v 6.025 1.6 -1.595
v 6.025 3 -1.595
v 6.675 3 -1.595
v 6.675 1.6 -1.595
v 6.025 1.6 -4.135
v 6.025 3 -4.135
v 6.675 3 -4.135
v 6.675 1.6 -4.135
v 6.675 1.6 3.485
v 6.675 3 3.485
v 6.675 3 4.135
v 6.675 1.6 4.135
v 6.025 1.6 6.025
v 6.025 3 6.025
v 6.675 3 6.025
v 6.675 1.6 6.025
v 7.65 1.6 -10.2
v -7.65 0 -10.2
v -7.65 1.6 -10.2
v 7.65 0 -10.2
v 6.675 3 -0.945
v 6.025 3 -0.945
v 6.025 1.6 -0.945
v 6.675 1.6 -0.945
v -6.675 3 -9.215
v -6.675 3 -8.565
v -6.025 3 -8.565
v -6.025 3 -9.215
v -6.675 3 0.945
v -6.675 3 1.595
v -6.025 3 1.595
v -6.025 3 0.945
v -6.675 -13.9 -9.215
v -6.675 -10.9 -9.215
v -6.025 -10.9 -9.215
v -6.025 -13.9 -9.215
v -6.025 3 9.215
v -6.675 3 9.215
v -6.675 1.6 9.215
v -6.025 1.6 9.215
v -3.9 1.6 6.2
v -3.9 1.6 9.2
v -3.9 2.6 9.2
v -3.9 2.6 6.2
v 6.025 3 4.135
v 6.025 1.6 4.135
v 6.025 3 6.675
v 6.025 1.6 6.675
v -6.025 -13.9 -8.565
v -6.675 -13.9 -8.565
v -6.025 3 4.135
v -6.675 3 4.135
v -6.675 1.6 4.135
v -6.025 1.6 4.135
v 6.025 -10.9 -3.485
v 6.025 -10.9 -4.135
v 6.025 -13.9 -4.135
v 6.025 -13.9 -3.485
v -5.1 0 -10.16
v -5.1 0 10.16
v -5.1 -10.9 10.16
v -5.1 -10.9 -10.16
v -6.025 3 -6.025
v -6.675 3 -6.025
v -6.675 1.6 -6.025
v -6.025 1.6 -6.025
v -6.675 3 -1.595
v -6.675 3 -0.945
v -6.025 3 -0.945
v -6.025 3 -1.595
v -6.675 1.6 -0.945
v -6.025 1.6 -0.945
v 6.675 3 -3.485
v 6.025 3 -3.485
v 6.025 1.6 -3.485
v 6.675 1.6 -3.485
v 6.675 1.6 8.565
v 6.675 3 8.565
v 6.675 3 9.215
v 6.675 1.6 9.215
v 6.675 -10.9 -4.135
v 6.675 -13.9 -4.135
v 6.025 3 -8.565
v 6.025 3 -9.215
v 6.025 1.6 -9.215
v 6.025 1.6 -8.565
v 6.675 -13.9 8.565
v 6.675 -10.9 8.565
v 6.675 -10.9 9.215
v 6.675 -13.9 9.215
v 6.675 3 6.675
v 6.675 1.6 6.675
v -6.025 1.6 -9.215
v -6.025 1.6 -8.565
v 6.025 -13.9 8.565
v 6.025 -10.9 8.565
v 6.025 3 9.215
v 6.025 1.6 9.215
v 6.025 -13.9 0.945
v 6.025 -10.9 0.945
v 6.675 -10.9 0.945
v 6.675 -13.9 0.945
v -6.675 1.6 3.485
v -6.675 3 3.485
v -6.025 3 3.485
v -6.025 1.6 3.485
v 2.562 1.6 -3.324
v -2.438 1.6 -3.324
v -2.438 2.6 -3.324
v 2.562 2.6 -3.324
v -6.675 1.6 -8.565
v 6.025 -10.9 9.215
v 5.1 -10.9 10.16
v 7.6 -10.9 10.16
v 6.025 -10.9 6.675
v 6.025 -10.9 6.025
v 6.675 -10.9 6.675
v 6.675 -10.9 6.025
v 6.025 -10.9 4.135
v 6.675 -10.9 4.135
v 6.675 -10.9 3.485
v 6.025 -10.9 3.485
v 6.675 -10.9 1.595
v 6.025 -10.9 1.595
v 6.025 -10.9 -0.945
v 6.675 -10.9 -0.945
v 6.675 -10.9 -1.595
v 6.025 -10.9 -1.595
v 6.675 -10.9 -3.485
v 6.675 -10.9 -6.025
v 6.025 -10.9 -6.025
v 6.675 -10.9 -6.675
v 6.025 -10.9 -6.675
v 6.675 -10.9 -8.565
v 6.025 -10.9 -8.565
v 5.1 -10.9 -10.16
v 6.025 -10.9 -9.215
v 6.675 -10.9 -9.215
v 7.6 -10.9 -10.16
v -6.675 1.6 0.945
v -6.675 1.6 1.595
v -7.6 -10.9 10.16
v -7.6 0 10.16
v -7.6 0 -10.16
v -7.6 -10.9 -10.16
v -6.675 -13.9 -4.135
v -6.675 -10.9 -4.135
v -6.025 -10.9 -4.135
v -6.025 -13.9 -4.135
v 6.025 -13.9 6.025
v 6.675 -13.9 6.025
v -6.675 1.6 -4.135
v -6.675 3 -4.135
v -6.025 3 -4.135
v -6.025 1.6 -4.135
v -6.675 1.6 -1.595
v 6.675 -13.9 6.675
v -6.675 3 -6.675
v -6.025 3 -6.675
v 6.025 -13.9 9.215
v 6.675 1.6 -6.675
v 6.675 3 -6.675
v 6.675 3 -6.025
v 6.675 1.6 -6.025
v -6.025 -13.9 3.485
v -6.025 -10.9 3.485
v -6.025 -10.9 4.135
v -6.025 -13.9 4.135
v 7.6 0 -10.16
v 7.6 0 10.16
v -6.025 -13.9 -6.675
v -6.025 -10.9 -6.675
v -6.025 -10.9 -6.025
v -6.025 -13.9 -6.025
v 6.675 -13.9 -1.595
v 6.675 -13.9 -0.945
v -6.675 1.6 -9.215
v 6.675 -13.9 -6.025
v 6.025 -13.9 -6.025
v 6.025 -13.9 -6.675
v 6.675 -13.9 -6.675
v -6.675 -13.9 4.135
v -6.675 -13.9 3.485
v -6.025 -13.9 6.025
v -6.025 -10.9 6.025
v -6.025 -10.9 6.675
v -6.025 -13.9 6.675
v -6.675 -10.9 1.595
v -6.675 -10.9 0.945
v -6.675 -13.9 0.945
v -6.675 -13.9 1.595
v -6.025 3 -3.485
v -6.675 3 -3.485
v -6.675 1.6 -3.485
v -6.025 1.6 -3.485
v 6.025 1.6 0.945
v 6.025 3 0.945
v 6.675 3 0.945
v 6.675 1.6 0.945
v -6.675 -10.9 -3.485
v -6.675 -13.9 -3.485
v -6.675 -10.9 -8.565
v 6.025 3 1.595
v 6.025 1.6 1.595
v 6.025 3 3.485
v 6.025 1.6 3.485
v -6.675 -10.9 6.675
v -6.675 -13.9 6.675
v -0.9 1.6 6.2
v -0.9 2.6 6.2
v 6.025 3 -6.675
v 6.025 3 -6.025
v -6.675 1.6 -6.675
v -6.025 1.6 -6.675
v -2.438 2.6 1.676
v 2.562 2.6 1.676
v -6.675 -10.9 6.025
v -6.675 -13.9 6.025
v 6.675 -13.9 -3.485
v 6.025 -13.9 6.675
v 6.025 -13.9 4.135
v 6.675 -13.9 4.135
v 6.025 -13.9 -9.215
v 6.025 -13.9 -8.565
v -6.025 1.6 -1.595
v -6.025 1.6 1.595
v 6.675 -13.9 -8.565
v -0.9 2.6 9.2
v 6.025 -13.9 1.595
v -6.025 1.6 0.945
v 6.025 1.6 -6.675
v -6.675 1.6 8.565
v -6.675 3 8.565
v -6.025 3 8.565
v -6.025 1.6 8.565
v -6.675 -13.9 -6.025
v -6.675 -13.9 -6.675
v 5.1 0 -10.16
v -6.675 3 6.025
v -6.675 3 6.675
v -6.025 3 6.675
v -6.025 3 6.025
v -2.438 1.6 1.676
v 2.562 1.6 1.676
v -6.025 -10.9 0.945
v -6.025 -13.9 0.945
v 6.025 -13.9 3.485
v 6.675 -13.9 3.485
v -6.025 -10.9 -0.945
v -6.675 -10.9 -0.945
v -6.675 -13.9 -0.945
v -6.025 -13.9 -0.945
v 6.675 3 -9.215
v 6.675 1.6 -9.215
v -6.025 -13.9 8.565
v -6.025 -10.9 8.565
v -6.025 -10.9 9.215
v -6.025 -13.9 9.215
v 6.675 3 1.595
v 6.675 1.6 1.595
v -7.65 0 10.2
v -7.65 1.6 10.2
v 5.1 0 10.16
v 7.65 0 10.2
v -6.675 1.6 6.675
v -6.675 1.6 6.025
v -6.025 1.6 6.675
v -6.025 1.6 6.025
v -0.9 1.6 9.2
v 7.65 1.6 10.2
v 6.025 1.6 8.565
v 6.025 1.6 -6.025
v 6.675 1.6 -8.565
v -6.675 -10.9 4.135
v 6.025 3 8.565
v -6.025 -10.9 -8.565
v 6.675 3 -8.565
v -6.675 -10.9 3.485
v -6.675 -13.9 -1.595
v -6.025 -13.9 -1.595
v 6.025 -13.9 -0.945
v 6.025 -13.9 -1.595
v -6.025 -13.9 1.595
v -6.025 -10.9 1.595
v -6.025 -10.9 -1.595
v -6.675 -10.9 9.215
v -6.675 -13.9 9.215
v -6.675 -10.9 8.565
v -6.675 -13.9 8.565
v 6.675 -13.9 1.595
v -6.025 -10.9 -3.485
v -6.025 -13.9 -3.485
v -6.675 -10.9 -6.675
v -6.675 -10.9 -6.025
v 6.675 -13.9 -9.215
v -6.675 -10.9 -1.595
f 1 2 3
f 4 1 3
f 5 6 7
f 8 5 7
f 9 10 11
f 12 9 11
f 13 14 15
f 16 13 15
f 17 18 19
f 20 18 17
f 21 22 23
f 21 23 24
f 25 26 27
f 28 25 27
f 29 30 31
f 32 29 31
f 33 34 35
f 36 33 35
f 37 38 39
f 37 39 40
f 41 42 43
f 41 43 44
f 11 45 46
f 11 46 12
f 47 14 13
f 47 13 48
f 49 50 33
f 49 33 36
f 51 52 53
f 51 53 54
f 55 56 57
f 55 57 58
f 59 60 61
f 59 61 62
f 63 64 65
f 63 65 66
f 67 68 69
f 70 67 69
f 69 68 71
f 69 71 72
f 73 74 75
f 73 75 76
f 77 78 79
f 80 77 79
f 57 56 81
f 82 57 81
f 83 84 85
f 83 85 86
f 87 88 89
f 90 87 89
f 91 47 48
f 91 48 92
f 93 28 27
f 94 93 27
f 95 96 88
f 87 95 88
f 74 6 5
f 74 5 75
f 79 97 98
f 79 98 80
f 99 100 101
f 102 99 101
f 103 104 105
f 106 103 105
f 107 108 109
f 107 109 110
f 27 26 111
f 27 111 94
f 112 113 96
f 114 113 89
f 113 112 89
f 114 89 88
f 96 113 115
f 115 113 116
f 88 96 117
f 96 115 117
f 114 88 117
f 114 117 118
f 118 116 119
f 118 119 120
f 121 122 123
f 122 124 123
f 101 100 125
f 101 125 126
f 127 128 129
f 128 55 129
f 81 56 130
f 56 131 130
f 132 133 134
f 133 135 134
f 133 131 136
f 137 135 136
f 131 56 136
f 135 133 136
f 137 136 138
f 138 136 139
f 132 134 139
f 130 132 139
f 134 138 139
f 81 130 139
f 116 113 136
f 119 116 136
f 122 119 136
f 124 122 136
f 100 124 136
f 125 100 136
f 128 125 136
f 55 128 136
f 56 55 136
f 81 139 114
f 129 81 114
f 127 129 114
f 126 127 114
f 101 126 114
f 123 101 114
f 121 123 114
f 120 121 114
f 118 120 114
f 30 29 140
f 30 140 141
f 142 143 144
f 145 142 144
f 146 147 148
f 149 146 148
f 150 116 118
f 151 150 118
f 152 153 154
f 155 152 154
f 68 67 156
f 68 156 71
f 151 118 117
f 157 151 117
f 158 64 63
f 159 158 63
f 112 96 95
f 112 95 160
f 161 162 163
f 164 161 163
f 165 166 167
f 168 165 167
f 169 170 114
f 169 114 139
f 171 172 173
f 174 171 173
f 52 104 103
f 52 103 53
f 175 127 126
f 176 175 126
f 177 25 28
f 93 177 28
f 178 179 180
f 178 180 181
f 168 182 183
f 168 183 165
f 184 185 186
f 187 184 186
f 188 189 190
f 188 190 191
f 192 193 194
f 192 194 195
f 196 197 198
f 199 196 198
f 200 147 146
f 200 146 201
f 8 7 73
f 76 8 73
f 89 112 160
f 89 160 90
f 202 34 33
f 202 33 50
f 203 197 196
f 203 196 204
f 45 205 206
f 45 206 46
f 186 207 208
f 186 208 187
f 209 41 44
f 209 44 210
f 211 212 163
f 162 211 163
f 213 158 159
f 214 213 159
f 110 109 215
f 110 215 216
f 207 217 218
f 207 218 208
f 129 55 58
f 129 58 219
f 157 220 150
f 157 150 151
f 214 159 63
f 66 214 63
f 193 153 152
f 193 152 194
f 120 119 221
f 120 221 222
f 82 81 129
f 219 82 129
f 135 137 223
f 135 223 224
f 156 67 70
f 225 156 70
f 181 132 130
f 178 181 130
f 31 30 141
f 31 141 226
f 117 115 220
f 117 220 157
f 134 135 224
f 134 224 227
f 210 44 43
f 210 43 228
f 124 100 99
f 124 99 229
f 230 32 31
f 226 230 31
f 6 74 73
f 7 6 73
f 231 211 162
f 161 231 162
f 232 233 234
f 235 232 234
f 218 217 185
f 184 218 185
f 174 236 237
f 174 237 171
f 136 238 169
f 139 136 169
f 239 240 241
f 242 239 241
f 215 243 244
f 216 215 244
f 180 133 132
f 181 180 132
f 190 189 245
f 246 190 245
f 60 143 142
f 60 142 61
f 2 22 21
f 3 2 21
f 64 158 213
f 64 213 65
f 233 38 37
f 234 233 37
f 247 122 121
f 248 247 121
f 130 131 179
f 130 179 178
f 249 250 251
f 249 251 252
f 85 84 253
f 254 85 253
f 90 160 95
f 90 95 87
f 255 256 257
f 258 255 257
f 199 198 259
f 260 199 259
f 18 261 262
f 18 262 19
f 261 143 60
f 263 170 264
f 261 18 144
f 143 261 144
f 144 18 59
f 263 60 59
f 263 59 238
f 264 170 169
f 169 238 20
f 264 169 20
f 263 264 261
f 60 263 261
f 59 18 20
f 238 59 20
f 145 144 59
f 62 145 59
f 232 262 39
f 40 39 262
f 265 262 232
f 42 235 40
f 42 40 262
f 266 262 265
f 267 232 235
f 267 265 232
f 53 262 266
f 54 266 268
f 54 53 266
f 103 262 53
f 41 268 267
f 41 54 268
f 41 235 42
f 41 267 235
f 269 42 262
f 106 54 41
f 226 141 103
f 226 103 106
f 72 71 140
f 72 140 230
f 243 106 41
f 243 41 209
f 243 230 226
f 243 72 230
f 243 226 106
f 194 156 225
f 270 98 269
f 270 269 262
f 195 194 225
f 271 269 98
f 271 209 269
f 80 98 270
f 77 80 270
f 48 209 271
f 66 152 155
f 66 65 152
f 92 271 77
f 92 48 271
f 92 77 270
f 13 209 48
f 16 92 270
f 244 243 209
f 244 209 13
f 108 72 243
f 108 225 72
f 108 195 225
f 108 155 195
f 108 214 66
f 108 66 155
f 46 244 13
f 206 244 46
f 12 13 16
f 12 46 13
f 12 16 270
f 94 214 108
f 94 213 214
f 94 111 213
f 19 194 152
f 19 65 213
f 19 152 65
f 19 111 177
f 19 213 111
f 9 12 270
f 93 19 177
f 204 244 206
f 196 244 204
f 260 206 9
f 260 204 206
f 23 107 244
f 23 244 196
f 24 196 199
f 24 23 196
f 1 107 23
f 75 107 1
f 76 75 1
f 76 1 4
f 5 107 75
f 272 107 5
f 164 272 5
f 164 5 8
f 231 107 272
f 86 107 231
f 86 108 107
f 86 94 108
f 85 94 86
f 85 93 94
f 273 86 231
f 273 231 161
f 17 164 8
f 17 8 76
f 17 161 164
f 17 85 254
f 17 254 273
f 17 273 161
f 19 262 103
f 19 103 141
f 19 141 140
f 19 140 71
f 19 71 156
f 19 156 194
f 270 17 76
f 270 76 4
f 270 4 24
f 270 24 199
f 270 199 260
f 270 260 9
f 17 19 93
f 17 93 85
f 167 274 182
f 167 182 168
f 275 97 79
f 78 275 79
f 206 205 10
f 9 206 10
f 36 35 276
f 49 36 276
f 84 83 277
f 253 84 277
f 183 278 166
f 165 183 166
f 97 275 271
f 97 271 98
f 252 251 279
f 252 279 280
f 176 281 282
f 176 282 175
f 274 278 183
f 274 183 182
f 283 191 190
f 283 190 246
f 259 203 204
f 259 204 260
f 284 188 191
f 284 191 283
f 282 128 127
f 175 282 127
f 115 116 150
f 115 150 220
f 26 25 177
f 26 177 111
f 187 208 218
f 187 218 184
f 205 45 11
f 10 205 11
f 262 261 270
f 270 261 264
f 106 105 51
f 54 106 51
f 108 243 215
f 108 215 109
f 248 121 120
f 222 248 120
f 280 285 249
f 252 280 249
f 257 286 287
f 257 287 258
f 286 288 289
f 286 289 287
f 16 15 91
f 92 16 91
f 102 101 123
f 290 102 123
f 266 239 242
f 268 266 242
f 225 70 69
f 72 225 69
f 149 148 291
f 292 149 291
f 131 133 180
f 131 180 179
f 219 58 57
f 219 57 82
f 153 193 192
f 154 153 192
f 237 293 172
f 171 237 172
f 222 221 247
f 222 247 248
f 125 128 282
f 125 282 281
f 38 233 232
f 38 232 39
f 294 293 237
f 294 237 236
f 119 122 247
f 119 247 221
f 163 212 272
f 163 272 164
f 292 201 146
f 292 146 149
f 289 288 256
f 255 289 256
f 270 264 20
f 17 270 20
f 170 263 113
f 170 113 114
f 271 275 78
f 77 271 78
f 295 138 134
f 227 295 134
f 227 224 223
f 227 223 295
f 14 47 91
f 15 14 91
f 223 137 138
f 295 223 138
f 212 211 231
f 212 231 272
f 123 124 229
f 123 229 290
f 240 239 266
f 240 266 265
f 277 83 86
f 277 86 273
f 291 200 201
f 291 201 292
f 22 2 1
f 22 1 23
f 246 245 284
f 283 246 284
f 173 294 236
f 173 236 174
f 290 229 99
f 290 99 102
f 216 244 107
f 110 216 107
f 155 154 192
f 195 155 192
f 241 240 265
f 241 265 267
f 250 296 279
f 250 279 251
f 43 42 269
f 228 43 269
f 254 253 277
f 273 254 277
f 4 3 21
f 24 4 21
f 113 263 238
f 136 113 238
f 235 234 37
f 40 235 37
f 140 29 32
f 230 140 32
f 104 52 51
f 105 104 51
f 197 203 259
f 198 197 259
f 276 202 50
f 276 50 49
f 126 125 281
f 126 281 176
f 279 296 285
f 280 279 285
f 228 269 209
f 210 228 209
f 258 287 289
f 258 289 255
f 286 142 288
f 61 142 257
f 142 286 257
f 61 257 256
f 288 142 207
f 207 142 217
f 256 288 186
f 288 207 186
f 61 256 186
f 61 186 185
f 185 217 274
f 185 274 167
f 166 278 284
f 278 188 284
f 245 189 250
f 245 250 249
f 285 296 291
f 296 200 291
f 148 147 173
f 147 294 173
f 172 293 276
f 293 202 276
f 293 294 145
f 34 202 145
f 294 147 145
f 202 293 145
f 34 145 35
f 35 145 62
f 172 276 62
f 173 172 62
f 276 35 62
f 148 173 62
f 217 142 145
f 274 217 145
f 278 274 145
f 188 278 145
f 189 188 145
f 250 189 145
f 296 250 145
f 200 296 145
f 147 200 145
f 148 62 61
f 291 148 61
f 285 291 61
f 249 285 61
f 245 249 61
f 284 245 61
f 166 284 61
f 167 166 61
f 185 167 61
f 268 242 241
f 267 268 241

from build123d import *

# Parameters (mm, degrees)
ESQUISSE1_W             = 15.3
ESQUISSE1_H             = 20.4
BOSS_EXTRU_1_DEPTH      = 1.6
ESQUISSE2_W             = 2.5
ESQUISSE2_H             = 20.32
BOSS_EXTRU_2_DEPTH      = 10.9
BOSS_EXTRU_3_DEPTH      = 3
BOSS_EXTRU_3_DEPTH_BACK = 13.9
ESQUISSE3_W             = 0.65
ESQUISSE3_H             = 0.65
ESQUISSE4_W             = 5
ESQUISSE4_H             = 5
ESQUISSE4_W_2           = 3
ESQUISSE4_H_2           = 3
BOSS_EXTRU_4_DEPTH      = 1


with BuildPart() as part:
    # Esquisse1 → Boss.-Extru.1 (new body)
    with BuildSketch(Plane(origin=(0, 0, 0), x_dir=(1, 0, 0), z_dir=(0, 1, 0))):
        Rectangle(ESQUISSE1_W, ESQUISSE1_H)
    extrude(amount=BOSS_EXTRU_1_DEPTH)

    # Esquisse2 → Boss.-Extru.2 (add)
    with BuildSketch(Plane(origin=(0, 0, 0), x_dir=(1, 0, 0), z_dir=(0, 1, 0))):
        with Locations((-6.35, 0)):
            Rectangle(ESQUISSE2_W, ESQUISSE2_H)
        with Locations((6.35, 0)):
            Rectangle(ESQUISSE2_W, ESQUISSE2_H)
    extrude(amount=-BOSS_EXTRU_2_DEPTH)

    # Esquisse3 → Boss.-Extru.3 (add, two sides: drawn at the far end of the back side and taken through both)
    with BuildSketch(Plane.XZ.offset(10.9).offset(-BOSS_EXTRU_3_DEPTH_BACK)):
        with Locations((-6.35, 1.27)):
            Rectangle(ESQUISSE3_W, ESQUISSE3_H)
        with Locations((-6.35, -1.27)):
            Rectangle(ESQUISSE3_W, ESQUISSE3_H)
        with Locations((-6.35, 3.81)):
            Rectangle(ESQUISSE3_W, ESQUISSE3_H)
        with Locations((-6.35, 6.35)):
            Rectangle(ESQUISSE3_W, ESQUISSE3_H)
        with Locations((-6.35, 8.89)):
            Rectangle(ESQUISSE3_W, ESQUISSE3_H)
        with Locations((-6.35, -8.89)):
            Rectangle(ESQUISSE3_W, ESQUISSE3_H)
        with Locations((-6.35, -6.35)):
            Rectangle(ESQUISSE3_W, ESQUISSE3_H)
        with Locations((-6.35, -3.81)):
            Rectangle(ESQUISSE3_W, ESQUISSE3_H)
        with Locations((6.35, -8.89)):
            Rectangle(ESQUISSE3_W, ESQUISSE3_H)
        with Locations((6.35, -6.35)):
            Rectangle(ESQUISSE3_W, ESQUISSE3_H)
        with Locations((6.35, -3.81)):
            Rectangle(ESQUISSE3_W, ESQUISSE3_H)
        with Locations((6.35, 1.27)):
            Rectangle(ESQUISSE3_W, ESQUISSE3_H)
        with Locations((6.35, -1.27)):
            Rectangle(ESQUISSE3_W, ESQUISSE3_H)
        with Locations((6.35, 3.81)):
            Rectangle(ESQUISSE3_W, ESQUISSE3_H)
        with Locations((6.35, 6.35)):
            Rectangle(ESQUISSE3_W, ESQUISSE3_H)
        with Locations((6.35, 8.89)):
            Rectangle(ESQUISSE3_W, ESQUISSE3_H)
    extrude(amount=BOSS_EXTRU_3_DEPTH + BOSS_EXTRU_3_DEPTH_BACK)

    # Esquisse4 → Boss.-Extru.4 (add)
    with BuildSketch(Plane(origin=(0, 1.6, 0), x_dir=(1, 0, 0), z_dir=(0, 1, 0))):
        with Locations((0.061900131, 0.824485309)):
            Rectangle(ESQUISSE4_W, ESQUISSE4_H)
        with Locations((-2.4, -7.7)):
            Rectangle(ESQUISSE4_W_2, ESQUISSE4_H_2)
    extrude(amount=BOSS_EXTRU_4_DEPTH)


solid = part.part
